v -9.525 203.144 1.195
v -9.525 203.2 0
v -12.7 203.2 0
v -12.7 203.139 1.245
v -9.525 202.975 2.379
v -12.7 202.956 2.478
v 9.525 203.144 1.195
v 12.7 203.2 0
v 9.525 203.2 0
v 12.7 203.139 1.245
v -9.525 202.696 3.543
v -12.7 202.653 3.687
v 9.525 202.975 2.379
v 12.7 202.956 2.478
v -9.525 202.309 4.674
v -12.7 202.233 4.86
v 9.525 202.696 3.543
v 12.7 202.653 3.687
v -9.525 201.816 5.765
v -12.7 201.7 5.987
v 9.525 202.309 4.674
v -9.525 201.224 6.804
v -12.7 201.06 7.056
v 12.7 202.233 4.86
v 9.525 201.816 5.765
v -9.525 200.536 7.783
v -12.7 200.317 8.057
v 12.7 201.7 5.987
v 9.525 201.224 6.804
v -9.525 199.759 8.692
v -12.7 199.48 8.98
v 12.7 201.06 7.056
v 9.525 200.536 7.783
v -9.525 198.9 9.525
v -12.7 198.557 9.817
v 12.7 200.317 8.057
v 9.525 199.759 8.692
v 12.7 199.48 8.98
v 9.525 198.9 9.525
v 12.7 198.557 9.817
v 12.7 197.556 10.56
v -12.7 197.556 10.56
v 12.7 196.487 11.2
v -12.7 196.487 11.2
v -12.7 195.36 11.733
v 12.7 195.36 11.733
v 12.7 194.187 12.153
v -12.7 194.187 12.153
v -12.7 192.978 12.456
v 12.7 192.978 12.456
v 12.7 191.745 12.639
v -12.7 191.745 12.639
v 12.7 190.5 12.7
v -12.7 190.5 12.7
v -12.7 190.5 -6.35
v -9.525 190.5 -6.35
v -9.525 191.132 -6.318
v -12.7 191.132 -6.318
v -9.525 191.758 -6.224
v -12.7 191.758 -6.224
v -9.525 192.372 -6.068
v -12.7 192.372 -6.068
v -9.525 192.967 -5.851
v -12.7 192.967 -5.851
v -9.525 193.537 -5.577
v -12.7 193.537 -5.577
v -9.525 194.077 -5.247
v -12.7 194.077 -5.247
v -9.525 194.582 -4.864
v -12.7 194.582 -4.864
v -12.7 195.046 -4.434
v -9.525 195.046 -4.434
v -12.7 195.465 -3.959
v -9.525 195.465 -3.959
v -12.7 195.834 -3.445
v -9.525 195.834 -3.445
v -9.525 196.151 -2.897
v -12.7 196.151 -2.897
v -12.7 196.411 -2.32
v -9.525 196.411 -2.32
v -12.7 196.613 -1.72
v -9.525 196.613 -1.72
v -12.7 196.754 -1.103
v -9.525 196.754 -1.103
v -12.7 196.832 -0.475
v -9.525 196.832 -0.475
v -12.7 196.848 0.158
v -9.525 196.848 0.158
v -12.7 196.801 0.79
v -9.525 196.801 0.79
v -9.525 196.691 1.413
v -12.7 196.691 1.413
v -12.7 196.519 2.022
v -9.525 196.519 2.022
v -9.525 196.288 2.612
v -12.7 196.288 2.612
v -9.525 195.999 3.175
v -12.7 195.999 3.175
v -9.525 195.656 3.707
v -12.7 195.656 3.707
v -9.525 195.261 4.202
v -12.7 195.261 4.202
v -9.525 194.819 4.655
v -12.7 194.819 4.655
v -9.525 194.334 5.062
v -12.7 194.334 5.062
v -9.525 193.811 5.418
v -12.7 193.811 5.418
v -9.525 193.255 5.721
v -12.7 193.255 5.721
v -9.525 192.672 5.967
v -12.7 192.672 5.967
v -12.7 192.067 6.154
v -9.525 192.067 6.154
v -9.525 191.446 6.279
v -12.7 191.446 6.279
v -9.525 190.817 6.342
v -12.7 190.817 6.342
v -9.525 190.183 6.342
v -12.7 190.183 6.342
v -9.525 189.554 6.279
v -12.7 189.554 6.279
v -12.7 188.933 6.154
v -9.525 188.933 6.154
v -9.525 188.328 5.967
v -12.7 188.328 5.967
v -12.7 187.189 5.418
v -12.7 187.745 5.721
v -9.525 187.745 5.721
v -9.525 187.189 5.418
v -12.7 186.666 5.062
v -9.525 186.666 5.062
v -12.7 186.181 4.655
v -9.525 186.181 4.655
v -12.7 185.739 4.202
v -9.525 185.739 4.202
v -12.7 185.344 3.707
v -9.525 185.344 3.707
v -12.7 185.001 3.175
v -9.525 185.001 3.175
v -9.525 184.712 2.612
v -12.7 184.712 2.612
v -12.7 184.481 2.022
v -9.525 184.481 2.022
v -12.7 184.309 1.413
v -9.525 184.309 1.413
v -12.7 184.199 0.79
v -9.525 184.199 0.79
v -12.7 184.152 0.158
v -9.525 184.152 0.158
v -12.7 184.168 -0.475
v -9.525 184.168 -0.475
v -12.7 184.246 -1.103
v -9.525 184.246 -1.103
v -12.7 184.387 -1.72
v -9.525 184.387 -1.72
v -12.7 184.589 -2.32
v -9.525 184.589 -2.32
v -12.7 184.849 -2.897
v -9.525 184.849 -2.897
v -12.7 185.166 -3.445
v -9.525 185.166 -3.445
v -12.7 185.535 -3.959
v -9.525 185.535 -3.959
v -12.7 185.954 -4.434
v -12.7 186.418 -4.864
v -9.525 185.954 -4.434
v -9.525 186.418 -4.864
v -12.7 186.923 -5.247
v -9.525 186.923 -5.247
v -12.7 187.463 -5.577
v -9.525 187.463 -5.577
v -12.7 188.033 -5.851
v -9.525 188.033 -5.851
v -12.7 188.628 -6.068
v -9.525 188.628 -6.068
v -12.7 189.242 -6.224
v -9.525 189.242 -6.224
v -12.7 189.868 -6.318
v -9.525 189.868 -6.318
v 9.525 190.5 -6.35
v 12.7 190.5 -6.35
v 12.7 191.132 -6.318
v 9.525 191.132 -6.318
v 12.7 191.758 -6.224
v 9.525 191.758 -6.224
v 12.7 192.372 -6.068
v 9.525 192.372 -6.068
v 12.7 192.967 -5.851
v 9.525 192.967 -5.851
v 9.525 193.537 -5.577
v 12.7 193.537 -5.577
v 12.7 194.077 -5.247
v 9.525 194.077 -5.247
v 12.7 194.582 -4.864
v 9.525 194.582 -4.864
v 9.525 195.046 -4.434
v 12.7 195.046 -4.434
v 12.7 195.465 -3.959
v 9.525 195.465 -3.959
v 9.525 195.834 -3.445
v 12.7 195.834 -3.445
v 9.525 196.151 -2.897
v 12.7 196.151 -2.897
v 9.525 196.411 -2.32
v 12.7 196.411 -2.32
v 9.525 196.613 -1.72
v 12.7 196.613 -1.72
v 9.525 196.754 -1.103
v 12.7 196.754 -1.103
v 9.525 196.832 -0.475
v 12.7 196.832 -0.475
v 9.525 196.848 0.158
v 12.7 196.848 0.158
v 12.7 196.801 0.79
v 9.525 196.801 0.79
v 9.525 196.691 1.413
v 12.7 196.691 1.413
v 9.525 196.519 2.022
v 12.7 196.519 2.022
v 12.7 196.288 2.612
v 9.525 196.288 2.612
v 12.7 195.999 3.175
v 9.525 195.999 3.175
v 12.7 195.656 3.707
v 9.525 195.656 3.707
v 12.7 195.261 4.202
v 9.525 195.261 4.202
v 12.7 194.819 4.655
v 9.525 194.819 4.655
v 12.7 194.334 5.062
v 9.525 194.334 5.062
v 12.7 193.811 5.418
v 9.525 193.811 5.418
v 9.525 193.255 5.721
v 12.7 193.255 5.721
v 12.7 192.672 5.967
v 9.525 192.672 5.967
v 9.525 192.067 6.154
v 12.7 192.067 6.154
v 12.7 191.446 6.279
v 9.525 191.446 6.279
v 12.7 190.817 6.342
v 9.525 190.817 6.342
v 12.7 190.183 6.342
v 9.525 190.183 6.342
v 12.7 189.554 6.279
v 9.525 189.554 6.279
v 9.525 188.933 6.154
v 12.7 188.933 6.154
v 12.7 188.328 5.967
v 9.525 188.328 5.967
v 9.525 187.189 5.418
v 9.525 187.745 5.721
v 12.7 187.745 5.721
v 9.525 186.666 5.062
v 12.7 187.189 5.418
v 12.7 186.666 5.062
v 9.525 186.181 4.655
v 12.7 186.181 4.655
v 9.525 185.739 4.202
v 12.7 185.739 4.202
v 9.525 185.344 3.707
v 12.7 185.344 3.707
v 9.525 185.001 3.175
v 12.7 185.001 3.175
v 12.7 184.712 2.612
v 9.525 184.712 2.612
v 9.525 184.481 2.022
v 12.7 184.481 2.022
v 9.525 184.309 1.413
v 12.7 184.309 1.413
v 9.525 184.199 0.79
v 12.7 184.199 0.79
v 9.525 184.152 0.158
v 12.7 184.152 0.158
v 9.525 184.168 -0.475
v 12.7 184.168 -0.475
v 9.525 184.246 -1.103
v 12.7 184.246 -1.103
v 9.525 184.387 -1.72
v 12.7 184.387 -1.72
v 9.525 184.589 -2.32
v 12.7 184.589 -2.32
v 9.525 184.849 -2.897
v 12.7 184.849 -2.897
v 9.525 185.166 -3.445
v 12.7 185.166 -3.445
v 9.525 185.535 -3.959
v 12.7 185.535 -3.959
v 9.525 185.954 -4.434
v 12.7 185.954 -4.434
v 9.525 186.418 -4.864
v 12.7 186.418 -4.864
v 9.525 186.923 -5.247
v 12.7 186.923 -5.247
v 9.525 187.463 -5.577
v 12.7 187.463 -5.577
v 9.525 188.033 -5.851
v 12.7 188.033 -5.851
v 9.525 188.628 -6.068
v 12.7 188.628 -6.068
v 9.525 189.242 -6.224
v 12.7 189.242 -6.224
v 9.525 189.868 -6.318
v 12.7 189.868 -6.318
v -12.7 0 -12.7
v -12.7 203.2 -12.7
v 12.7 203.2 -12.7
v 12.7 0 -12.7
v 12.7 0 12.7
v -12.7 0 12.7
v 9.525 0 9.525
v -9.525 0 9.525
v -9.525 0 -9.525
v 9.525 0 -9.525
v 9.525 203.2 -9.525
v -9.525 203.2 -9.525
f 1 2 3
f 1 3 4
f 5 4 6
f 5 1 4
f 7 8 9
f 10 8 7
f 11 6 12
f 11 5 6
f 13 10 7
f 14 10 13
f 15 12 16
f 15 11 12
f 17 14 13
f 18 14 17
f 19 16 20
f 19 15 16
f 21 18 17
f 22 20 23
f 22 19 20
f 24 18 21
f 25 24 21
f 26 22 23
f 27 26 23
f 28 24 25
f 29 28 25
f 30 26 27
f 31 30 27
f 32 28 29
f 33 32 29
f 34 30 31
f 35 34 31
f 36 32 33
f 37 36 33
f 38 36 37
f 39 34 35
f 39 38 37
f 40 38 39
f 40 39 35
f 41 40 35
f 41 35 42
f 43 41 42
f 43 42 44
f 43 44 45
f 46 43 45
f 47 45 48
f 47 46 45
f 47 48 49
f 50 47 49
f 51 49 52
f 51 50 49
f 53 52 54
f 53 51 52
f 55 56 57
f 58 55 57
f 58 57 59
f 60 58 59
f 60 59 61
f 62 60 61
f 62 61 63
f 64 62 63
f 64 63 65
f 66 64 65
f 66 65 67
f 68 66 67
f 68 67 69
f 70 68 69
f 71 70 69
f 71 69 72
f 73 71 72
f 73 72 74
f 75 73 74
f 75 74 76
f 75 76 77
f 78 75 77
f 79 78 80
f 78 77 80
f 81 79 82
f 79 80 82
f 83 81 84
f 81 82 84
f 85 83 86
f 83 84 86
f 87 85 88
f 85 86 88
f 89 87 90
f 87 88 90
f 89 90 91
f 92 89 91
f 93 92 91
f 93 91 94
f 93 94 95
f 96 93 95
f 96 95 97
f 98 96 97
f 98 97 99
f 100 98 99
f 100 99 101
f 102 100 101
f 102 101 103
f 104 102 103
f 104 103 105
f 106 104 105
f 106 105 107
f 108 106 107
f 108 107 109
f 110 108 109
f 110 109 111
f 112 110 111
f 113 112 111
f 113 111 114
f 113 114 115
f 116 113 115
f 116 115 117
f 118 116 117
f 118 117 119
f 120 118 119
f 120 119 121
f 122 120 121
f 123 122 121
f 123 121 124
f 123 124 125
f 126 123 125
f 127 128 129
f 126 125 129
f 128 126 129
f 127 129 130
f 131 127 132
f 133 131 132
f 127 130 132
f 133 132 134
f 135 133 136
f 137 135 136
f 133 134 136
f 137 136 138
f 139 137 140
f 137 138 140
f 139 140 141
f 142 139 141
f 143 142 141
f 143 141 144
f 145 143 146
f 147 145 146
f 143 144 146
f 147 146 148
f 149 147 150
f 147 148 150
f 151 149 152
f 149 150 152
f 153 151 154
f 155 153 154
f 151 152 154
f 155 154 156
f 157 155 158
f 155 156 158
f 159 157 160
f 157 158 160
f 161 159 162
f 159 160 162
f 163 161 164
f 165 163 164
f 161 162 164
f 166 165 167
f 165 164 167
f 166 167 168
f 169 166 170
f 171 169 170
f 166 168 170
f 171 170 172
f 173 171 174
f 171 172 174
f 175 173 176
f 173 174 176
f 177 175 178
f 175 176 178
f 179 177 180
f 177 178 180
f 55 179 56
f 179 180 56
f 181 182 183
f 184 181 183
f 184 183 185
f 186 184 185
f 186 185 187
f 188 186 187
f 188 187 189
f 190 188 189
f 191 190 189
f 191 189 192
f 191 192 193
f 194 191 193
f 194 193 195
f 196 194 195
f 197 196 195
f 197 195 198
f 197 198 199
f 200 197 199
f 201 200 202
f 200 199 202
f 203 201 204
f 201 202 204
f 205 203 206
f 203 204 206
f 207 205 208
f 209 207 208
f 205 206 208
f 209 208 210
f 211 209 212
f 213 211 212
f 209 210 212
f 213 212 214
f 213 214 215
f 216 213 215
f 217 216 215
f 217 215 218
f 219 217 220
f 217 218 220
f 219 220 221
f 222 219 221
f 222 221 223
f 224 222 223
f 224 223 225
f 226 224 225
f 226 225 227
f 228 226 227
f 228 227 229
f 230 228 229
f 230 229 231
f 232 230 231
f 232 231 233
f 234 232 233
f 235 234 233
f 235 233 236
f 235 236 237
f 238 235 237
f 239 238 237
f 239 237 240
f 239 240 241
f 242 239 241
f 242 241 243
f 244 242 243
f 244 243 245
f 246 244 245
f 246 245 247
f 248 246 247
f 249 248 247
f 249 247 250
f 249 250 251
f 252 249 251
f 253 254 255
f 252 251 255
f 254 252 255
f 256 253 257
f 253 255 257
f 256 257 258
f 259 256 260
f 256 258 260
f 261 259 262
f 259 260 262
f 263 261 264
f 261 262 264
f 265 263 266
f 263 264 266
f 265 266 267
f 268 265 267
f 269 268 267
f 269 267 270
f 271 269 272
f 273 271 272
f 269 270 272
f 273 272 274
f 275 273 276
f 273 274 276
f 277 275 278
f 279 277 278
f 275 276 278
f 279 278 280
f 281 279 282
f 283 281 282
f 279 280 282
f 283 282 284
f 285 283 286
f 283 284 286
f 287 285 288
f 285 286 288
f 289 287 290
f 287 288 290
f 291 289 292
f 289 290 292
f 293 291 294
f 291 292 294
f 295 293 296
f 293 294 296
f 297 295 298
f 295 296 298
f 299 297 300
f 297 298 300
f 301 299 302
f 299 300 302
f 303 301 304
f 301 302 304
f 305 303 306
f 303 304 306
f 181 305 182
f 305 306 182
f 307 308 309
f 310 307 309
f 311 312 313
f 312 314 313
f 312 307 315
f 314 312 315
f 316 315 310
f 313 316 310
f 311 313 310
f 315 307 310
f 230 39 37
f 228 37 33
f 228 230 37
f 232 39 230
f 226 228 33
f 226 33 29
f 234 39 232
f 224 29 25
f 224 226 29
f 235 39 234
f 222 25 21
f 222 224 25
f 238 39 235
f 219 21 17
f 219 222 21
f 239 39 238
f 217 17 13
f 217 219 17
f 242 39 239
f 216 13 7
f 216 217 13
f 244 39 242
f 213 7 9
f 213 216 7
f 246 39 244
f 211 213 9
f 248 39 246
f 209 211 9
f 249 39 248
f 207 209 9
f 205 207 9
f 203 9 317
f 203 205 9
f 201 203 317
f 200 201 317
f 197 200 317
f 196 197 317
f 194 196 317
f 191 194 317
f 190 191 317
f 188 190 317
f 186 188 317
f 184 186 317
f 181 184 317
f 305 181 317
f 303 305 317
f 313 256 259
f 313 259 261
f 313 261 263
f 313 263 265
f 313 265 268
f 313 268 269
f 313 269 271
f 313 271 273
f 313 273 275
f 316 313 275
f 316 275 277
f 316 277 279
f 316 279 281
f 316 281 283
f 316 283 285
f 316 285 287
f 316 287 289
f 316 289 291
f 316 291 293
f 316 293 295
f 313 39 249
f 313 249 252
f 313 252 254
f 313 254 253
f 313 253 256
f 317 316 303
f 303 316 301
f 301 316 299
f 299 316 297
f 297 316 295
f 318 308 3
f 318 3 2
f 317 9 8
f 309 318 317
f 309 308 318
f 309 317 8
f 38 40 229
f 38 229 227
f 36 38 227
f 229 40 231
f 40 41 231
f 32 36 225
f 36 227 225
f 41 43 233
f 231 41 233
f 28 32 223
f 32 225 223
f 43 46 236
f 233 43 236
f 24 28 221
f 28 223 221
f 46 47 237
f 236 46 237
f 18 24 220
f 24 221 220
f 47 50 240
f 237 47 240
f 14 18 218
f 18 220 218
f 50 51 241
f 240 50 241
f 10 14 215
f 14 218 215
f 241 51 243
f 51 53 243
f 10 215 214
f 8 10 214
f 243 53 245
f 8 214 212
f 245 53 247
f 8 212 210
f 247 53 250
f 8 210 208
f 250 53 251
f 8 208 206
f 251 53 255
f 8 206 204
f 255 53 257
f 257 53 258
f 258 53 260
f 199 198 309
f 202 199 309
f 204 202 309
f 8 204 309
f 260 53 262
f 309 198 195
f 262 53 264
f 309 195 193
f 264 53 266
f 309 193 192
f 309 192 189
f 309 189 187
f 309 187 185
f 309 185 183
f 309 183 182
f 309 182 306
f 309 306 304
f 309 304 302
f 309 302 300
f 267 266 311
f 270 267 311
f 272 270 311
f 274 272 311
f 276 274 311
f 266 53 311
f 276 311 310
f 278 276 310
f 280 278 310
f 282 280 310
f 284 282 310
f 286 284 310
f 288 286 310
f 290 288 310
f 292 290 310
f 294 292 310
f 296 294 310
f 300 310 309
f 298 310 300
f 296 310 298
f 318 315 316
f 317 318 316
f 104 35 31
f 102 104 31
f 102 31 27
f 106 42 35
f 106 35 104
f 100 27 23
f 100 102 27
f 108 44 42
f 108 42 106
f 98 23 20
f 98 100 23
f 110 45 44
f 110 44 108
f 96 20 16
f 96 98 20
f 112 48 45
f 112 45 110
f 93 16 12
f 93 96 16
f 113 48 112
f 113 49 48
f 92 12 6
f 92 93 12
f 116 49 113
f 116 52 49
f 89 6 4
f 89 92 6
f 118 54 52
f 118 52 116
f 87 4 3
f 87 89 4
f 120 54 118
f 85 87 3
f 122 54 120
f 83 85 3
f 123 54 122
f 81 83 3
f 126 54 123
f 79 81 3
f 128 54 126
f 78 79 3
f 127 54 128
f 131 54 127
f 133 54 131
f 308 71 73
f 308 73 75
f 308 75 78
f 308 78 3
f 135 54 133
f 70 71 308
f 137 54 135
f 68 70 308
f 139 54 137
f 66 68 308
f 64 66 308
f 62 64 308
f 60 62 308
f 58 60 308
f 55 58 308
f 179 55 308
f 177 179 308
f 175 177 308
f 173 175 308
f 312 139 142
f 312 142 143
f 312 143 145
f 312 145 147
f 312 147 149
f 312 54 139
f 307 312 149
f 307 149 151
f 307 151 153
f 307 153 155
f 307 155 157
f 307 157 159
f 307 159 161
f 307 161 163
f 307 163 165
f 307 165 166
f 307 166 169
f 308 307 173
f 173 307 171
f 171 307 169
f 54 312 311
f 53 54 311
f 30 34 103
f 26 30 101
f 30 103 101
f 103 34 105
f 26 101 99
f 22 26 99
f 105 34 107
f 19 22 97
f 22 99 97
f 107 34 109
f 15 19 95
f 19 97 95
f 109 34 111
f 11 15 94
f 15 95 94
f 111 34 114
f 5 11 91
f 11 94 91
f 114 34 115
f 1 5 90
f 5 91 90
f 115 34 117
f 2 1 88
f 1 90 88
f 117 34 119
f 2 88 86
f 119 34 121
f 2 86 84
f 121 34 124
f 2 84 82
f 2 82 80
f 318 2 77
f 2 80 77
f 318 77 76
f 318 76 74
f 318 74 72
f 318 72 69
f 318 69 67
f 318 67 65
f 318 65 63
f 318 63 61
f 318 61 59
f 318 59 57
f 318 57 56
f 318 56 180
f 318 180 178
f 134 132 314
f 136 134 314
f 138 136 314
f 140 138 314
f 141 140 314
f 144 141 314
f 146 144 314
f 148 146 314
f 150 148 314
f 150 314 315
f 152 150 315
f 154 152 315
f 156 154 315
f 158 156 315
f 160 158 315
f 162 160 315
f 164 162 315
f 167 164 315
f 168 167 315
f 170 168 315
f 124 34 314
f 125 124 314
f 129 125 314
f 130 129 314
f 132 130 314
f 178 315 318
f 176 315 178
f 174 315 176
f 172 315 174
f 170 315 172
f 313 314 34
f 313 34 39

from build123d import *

# Parameters (mm, degrees)
SKETCH1_W           = 25.4
SKETCH1_H           = 25.4
SKETCH1_W_2         = 19.05
SKETCH1_H_2         = 19.05
EXTRUDE_THIN1_DEPTH = 203.2
SKETCH2_R           = 6.35
CUT_EXTRUDE1_DEPTH  = 206.174779152
CUT_EXTRUDE3_DEPTH  = 206.174779152


with BuildPart() as part:
    # Sketch1 → Extrude-Thin1 (new body)
    with BuildSketch(Plane(origin=(0, 0, 0), x_dir=(1, 0, 0), z_dir=(0, 1, 0))):
        Rectangle(SKETCH1_W, SKETCH1_H)
        Rectangle(SKETCH1_W_2, SKETCH1_H_2, mode=Mode.SUBTRACT)
    extrude(amount=EXTRUDE_THIN1_DEPTH)

    # Sketch2 → Cut-Extrude1 (cut, through all)
    with BuildSketch(Plane(origin=(12.7, 0, 0), x_dir=(0, 0, -1), z_dir=(1, 0, 0))):
        with Locations((0, 190.5)):
            Circle(SKETCH2_R)
    extrude(amount=-CUT_EXTRUDE1_DEPTH, mode=Mode.SUBTRACT)

    # Sketch4 → Cut-Extrude3 (cut, through all)
    with BuildSketch(Plane(origin=(12.7, 0, 0), x_dir=(0, 0, -1), z_dir=(1, 0, 0))):
        with BuildLine():
            Line((-12.7, 190.5), (-12.7, 203.2))
            Line((-12.7, 203.2), (0, 203.2))
            ThreePointArc((0, 203.2), (-8.980256121, 199.480256121), (-12.7, 190.5))
        make_face()
    extrude(amount=-CUT_EXTRUDE3_DEPTH, mode=Mode.SUBTRACT)


solid = part.part
